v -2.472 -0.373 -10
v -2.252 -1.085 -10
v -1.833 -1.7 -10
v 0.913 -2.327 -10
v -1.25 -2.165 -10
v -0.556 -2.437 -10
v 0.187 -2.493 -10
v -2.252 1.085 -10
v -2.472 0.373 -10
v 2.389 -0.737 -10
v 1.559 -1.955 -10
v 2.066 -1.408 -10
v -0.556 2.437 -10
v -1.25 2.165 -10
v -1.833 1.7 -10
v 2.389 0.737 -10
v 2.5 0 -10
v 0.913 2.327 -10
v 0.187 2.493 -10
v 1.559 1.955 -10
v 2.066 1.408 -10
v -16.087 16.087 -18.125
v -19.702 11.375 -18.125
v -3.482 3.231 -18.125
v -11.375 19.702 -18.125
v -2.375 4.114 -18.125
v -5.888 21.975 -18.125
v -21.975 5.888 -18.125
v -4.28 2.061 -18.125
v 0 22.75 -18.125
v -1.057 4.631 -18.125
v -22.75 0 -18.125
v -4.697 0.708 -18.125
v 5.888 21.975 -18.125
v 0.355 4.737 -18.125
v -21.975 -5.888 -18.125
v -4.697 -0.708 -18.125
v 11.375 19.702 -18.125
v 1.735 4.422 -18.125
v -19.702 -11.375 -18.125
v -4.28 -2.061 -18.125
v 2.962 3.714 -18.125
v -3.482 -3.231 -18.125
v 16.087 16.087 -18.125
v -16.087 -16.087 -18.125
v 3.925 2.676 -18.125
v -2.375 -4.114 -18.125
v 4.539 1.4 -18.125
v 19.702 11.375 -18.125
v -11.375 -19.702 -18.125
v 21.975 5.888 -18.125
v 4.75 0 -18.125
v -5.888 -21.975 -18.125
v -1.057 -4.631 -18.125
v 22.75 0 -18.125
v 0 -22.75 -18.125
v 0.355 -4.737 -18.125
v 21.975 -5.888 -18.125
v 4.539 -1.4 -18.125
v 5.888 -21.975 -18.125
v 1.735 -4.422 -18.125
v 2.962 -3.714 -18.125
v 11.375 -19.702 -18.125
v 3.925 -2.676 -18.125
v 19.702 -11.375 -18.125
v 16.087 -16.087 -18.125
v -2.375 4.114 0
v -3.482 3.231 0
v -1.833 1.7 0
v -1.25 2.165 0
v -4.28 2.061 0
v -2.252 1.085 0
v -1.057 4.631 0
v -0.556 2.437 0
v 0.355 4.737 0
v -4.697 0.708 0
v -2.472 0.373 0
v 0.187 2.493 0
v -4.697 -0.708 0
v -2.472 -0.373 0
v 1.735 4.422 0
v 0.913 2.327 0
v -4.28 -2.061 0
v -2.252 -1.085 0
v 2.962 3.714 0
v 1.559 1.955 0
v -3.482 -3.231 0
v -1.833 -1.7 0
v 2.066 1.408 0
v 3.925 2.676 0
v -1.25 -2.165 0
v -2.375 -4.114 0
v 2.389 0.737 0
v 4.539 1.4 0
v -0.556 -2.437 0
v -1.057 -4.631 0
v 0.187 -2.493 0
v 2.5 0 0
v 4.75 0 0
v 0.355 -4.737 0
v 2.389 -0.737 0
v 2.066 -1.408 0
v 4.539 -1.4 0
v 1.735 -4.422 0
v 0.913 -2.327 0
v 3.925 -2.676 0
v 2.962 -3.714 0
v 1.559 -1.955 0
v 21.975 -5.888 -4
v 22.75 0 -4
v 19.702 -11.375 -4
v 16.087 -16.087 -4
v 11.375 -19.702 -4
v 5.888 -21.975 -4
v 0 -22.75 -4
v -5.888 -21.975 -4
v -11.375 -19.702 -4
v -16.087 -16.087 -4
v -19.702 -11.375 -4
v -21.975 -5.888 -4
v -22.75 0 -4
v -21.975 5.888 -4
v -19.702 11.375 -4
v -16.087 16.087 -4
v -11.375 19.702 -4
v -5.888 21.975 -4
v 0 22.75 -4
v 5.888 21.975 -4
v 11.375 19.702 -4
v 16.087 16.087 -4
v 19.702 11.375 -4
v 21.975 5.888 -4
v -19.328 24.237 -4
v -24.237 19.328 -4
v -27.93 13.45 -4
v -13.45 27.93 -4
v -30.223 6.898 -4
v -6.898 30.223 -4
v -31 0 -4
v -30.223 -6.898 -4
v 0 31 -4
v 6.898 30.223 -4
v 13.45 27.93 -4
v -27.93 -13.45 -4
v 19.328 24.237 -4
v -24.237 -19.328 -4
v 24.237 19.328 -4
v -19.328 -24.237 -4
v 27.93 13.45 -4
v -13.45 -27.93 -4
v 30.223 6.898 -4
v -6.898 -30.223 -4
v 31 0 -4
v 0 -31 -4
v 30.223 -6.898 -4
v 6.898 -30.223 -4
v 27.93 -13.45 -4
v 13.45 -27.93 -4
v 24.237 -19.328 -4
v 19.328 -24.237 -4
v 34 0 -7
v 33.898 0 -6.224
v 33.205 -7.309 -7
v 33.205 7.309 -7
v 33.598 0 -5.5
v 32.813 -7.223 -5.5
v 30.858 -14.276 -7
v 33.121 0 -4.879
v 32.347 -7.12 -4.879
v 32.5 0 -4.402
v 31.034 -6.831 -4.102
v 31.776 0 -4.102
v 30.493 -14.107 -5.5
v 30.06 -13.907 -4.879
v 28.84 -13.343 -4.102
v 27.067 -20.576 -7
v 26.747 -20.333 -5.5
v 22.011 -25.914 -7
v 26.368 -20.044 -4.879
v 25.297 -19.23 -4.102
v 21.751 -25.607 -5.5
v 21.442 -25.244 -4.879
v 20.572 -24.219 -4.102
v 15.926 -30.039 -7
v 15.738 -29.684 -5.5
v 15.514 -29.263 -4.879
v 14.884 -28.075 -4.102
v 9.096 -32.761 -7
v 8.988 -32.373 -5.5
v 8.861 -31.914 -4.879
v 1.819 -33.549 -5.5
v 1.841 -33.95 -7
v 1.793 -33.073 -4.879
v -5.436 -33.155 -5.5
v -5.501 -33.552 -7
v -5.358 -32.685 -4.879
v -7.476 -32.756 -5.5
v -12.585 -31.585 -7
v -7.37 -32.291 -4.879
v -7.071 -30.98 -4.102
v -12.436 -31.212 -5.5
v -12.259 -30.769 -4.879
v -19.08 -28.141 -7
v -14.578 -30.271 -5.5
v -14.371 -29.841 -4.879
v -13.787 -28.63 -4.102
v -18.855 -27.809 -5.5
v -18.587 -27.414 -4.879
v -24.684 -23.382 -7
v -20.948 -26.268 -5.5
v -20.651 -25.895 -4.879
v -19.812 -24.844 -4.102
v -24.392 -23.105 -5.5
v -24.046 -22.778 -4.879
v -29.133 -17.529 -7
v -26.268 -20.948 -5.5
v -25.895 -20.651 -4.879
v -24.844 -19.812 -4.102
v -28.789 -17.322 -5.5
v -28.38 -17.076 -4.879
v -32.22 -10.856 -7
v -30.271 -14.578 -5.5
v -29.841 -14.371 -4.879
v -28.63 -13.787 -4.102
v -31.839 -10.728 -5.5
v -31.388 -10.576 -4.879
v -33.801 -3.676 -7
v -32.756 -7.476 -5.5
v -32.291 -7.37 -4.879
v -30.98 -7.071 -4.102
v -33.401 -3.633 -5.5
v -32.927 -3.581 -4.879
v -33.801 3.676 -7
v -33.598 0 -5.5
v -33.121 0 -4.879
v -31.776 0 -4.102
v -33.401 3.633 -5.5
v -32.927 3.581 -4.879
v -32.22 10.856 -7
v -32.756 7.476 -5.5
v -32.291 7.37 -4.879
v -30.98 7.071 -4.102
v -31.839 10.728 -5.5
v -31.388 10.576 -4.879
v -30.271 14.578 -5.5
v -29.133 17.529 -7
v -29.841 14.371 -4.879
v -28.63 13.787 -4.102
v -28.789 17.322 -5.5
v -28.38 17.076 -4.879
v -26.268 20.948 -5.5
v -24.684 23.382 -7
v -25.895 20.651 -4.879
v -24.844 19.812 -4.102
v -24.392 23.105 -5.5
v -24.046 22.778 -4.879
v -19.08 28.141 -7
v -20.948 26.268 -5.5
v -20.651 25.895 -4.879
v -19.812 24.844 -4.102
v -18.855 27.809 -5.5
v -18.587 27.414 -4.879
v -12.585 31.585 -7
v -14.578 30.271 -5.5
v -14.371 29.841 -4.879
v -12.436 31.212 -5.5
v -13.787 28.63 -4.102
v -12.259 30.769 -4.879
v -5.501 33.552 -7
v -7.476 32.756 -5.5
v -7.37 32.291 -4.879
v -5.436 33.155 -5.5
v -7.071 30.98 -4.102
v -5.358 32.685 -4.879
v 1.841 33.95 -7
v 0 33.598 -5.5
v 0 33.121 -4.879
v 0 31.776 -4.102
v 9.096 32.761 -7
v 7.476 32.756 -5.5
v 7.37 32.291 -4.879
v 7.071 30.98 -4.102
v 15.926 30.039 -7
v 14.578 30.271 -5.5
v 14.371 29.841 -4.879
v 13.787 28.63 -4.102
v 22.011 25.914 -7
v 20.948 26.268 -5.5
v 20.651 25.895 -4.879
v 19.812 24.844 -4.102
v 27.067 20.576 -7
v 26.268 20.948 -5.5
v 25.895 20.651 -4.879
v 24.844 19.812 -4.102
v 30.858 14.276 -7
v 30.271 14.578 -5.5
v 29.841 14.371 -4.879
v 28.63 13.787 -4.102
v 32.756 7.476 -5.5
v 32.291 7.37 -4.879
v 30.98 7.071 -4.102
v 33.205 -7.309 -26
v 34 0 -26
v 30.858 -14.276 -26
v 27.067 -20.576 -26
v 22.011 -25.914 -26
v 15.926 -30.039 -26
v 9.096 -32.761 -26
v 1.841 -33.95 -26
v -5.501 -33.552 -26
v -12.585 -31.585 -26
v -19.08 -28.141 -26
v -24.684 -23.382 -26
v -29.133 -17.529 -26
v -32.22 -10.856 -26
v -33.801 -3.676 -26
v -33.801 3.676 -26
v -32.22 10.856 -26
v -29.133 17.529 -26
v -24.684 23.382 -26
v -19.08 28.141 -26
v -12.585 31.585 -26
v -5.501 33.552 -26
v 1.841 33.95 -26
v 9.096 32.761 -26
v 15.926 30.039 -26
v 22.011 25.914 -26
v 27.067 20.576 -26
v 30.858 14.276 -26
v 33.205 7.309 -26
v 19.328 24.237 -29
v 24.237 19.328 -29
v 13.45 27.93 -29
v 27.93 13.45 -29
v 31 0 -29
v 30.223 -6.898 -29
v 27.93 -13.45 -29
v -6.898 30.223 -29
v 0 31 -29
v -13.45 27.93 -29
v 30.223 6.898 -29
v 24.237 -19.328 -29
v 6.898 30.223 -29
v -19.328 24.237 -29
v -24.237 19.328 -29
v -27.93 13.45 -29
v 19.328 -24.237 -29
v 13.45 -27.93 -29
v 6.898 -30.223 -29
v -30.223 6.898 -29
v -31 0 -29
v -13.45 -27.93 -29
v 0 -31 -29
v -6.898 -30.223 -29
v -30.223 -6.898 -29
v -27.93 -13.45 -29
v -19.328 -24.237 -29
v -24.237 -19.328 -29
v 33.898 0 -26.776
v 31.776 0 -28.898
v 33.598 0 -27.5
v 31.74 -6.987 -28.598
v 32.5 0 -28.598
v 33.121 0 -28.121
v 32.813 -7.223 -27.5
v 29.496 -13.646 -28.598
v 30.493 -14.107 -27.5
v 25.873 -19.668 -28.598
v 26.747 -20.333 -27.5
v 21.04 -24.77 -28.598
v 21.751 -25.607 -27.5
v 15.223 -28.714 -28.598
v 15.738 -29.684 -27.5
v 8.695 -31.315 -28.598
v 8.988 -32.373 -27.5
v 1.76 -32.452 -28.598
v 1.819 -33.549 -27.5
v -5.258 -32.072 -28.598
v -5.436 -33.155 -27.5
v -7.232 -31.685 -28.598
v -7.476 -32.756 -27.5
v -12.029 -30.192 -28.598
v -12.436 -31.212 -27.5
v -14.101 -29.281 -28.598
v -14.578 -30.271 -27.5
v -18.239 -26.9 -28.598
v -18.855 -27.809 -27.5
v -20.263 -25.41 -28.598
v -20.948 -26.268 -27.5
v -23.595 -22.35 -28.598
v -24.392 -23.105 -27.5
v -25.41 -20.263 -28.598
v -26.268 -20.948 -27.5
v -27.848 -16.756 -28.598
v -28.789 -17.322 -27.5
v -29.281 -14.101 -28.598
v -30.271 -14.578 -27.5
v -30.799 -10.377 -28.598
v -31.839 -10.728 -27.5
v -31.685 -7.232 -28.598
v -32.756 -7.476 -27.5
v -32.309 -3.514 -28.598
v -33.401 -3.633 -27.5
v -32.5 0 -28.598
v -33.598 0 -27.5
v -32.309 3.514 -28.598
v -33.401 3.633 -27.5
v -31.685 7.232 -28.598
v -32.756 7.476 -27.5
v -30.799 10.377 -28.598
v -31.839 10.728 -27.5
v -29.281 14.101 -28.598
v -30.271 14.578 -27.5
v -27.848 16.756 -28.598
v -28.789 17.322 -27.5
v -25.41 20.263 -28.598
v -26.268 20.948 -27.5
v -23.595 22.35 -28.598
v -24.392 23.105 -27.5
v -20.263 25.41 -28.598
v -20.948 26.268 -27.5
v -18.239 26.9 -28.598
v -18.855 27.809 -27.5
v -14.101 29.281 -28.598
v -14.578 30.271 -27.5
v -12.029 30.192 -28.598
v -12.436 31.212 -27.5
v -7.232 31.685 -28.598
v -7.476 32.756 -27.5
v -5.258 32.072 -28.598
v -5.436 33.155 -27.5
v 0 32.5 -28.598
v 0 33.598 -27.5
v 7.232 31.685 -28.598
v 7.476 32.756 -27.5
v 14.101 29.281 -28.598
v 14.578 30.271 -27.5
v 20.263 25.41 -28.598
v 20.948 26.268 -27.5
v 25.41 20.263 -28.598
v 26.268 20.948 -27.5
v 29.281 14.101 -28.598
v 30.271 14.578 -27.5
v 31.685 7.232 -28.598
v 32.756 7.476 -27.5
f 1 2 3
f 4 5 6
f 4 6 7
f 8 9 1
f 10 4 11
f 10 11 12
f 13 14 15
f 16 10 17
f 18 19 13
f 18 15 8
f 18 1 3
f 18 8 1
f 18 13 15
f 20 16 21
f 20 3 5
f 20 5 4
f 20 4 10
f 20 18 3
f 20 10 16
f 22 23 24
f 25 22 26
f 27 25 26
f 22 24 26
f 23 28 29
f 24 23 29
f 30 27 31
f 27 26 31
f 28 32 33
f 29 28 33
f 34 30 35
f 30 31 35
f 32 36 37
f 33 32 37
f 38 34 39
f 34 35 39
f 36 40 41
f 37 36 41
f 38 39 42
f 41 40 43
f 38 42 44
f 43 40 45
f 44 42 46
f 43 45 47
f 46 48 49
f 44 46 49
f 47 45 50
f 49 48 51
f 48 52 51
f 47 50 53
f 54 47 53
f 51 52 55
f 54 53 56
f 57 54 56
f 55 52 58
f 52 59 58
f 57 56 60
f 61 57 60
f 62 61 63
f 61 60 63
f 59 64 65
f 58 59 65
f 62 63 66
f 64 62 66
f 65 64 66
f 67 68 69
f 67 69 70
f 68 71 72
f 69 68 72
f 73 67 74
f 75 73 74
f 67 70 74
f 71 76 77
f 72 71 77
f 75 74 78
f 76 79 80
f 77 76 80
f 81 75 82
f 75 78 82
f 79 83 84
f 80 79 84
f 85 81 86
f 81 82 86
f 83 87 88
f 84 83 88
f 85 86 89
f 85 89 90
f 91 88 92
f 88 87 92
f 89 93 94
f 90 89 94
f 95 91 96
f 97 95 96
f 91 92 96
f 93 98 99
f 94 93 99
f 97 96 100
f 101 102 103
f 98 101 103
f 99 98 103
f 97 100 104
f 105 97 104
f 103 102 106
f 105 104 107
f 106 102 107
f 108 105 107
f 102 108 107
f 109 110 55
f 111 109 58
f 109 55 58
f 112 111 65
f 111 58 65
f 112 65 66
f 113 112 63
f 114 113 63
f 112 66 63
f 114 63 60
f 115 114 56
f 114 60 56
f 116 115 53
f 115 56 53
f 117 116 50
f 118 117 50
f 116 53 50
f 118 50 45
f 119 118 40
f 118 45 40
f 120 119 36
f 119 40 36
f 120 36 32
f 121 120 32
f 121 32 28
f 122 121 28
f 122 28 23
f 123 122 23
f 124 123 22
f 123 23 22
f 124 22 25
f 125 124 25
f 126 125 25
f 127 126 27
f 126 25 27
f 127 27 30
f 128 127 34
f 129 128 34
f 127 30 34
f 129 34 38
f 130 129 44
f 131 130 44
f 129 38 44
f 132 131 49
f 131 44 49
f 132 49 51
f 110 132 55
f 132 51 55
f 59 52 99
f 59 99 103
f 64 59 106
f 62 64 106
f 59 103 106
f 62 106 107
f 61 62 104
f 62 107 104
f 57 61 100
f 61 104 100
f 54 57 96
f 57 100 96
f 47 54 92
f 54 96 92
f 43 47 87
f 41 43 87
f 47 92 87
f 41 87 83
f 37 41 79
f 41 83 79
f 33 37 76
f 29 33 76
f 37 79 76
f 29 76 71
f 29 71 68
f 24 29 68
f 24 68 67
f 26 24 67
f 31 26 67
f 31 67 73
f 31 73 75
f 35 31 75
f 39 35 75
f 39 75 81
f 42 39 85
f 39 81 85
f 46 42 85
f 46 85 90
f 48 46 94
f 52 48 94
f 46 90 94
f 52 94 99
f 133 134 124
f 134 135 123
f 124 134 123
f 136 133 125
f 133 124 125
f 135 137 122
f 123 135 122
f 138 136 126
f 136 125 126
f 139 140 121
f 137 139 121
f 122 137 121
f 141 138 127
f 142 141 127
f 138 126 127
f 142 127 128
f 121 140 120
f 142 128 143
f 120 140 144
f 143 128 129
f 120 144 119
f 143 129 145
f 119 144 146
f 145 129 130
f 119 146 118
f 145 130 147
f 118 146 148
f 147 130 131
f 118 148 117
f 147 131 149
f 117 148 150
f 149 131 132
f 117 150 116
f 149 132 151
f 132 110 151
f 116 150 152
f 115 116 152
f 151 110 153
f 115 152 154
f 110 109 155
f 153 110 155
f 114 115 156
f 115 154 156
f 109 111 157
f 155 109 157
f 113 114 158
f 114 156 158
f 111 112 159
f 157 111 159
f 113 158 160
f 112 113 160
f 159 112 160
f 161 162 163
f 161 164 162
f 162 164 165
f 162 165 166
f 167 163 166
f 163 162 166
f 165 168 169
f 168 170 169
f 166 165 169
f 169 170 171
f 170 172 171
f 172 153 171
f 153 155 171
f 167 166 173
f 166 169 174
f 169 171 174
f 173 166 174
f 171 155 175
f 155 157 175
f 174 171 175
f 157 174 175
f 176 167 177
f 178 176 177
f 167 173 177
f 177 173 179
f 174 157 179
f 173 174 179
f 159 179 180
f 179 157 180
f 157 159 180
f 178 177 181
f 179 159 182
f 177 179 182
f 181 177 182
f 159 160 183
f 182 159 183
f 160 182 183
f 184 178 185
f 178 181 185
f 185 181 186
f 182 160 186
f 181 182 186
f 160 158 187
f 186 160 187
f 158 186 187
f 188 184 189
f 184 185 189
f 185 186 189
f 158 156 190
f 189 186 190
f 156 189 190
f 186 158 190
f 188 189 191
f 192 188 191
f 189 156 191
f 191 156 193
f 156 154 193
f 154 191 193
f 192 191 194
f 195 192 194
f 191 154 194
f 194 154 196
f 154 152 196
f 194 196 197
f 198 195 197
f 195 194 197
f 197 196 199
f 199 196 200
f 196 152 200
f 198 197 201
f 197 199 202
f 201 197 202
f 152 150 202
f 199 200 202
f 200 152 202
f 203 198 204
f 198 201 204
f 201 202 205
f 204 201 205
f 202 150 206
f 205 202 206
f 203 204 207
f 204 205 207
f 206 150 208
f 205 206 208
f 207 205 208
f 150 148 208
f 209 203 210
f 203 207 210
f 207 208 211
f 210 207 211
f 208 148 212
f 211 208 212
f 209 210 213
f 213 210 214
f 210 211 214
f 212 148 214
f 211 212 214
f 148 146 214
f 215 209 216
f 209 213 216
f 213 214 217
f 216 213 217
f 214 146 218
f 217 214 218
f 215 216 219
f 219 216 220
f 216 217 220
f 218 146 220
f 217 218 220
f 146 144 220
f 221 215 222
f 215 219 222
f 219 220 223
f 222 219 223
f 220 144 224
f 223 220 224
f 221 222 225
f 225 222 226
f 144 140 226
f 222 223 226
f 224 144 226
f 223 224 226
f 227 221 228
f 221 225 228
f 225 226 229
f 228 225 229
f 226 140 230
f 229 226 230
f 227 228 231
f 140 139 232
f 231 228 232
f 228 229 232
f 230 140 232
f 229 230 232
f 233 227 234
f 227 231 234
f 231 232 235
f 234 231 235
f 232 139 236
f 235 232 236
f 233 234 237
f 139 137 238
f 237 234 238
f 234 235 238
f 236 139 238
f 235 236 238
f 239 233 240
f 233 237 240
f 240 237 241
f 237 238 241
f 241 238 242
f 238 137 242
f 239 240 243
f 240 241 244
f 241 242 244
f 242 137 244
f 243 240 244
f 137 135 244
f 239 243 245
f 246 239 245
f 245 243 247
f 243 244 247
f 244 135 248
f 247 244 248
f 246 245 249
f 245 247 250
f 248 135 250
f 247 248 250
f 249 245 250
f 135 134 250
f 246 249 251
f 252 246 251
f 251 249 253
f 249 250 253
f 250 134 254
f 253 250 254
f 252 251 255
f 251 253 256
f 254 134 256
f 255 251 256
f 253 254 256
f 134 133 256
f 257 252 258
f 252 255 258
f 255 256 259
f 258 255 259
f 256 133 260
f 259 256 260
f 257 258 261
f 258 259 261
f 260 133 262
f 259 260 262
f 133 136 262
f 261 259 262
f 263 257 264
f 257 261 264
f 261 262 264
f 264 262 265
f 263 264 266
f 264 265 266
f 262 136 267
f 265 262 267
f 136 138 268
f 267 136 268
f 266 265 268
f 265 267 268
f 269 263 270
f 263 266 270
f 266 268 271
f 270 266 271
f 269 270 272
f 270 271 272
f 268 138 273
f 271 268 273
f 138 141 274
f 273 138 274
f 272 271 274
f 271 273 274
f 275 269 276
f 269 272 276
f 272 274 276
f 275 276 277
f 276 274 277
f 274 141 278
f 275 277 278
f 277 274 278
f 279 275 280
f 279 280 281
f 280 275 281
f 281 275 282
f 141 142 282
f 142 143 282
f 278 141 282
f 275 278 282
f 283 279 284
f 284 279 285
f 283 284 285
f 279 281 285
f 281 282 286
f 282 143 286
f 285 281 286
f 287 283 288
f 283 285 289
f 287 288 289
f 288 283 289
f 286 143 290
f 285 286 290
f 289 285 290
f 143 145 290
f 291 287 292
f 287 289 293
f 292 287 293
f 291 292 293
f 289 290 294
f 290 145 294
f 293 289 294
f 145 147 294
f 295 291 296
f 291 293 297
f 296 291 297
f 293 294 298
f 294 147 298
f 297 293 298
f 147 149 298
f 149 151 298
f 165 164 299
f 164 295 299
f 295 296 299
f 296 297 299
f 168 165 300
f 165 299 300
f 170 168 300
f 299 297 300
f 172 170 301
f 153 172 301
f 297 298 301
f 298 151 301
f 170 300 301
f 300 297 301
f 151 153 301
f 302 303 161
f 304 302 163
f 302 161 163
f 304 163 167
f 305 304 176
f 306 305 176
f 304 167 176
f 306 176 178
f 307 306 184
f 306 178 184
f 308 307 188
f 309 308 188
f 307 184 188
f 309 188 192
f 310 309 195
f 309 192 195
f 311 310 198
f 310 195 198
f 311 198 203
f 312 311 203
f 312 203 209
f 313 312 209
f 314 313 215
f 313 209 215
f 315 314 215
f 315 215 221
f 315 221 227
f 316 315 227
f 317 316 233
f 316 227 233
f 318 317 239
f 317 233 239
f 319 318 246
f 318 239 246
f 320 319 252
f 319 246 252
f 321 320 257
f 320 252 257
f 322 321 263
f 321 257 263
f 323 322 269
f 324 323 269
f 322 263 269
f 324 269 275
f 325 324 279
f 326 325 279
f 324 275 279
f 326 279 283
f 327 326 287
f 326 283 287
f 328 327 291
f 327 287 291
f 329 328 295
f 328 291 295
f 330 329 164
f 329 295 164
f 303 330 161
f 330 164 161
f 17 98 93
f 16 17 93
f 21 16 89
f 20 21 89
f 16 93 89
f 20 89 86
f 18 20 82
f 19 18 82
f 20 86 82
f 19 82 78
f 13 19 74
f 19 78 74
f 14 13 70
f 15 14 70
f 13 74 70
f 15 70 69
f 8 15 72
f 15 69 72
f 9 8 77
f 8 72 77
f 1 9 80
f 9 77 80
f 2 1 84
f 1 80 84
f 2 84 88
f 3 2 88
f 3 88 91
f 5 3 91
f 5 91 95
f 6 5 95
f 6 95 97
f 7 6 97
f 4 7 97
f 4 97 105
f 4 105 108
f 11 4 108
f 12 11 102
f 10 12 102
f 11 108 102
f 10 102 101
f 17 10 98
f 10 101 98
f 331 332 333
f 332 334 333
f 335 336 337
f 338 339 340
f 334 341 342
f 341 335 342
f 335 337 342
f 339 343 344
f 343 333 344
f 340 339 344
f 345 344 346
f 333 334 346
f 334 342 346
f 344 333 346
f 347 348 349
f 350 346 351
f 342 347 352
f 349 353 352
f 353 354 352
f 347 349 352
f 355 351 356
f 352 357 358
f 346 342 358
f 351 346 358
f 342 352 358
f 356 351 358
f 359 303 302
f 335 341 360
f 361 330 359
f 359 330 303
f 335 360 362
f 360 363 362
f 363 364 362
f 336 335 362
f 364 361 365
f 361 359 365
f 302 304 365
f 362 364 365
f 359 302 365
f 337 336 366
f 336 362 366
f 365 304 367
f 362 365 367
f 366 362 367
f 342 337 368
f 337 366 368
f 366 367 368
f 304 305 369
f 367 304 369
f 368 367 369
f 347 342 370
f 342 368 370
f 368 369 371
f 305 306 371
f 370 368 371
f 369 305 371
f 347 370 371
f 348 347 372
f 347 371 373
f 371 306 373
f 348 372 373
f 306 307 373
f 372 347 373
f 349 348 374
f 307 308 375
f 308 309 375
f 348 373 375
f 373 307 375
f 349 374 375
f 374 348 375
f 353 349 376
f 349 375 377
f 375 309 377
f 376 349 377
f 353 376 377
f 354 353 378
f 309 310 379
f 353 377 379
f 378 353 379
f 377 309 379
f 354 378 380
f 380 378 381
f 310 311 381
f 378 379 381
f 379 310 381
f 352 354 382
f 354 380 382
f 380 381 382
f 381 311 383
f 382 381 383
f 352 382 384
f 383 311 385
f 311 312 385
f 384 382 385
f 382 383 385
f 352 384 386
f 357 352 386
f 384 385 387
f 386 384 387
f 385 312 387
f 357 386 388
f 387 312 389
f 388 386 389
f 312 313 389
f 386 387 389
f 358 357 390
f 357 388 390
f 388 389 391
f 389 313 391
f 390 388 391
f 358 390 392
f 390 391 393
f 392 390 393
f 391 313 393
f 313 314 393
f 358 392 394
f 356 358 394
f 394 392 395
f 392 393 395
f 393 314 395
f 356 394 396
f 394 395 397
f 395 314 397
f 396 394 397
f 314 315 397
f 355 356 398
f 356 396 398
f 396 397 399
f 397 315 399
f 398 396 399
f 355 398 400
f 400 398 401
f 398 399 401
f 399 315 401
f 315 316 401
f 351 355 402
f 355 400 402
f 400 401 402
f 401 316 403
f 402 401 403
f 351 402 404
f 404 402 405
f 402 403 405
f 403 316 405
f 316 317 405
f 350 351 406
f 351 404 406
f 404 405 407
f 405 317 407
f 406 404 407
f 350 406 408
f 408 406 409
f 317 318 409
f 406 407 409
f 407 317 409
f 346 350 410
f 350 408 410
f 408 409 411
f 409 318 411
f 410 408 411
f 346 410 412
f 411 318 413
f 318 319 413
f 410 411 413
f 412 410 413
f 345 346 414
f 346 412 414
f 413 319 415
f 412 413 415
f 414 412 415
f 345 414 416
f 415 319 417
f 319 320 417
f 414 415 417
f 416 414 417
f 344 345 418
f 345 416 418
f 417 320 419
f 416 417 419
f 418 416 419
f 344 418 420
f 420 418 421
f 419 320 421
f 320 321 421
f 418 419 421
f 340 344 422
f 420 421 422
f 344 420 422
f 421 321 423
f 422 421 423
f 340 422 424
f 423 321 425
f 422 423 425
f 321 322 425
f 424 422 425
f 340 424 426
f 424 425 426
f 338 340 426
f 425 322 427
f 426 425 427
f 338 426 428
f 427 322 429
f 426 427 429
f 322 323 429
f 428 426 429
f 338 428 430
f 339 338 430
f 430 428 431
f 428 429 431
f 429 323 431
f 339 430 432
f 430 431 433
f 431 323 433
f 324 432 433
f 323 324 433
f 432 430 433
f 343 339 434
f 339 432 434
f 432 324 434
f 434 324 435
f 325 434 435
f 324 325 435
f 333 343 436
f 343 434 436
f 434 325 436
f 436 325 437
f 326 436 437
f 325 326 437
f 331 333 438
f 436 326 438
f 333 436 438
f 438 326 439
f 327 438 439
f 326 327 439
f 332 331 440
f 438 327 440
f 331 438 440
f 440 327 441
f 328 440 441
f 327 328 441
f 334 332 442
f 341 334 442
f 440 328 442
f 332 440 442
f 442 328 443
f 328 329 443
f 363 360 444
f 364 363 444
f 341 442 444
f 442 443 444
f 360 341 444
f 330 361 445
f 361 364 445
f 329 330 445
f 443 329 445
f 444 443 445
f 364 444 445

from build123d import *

# Parameters (mm, degrees)
FILLET1_R          = 3
SKETCH2_R          = 2.5
CUT_EXTRUDE1_DEPTH = 10


with BuildPart() as part:
    # Sketch1 → Revolve1 (revolve)
    with BuildSketch(Plane(origin=(0, 0, 0), x_dir=(1, 0, 0), z_dir=(0, 1, 0))):
        Polygon((0, 0), (0, 29), (34, 29), (34, 4), (22.75, 4), (22.75, 18.125), (4.75, 18.125), (4.75, 0), align=None)
    revolve(axis=Axis((0, 0, 0), (0, 0, -1)))

    # Fillet1
    fillet1_edges = [part.edges().sort_by_distance(p)[0] for p in [
        (-34, 0, -4),
        (-34, 0, -29),
    ]]
    fillet(fillet1_edges, radius=FILLET1_R)

    # Sketch2 → Cut-Extrude1 (cut)
    with BuildSketch(Plane.XY):
        Circle(SKETCH2_R)
    extrude(amount=-CUT_EXTRUDE1_DEPTH, mode=Mode.SUBTRACT)


solid = part.part
